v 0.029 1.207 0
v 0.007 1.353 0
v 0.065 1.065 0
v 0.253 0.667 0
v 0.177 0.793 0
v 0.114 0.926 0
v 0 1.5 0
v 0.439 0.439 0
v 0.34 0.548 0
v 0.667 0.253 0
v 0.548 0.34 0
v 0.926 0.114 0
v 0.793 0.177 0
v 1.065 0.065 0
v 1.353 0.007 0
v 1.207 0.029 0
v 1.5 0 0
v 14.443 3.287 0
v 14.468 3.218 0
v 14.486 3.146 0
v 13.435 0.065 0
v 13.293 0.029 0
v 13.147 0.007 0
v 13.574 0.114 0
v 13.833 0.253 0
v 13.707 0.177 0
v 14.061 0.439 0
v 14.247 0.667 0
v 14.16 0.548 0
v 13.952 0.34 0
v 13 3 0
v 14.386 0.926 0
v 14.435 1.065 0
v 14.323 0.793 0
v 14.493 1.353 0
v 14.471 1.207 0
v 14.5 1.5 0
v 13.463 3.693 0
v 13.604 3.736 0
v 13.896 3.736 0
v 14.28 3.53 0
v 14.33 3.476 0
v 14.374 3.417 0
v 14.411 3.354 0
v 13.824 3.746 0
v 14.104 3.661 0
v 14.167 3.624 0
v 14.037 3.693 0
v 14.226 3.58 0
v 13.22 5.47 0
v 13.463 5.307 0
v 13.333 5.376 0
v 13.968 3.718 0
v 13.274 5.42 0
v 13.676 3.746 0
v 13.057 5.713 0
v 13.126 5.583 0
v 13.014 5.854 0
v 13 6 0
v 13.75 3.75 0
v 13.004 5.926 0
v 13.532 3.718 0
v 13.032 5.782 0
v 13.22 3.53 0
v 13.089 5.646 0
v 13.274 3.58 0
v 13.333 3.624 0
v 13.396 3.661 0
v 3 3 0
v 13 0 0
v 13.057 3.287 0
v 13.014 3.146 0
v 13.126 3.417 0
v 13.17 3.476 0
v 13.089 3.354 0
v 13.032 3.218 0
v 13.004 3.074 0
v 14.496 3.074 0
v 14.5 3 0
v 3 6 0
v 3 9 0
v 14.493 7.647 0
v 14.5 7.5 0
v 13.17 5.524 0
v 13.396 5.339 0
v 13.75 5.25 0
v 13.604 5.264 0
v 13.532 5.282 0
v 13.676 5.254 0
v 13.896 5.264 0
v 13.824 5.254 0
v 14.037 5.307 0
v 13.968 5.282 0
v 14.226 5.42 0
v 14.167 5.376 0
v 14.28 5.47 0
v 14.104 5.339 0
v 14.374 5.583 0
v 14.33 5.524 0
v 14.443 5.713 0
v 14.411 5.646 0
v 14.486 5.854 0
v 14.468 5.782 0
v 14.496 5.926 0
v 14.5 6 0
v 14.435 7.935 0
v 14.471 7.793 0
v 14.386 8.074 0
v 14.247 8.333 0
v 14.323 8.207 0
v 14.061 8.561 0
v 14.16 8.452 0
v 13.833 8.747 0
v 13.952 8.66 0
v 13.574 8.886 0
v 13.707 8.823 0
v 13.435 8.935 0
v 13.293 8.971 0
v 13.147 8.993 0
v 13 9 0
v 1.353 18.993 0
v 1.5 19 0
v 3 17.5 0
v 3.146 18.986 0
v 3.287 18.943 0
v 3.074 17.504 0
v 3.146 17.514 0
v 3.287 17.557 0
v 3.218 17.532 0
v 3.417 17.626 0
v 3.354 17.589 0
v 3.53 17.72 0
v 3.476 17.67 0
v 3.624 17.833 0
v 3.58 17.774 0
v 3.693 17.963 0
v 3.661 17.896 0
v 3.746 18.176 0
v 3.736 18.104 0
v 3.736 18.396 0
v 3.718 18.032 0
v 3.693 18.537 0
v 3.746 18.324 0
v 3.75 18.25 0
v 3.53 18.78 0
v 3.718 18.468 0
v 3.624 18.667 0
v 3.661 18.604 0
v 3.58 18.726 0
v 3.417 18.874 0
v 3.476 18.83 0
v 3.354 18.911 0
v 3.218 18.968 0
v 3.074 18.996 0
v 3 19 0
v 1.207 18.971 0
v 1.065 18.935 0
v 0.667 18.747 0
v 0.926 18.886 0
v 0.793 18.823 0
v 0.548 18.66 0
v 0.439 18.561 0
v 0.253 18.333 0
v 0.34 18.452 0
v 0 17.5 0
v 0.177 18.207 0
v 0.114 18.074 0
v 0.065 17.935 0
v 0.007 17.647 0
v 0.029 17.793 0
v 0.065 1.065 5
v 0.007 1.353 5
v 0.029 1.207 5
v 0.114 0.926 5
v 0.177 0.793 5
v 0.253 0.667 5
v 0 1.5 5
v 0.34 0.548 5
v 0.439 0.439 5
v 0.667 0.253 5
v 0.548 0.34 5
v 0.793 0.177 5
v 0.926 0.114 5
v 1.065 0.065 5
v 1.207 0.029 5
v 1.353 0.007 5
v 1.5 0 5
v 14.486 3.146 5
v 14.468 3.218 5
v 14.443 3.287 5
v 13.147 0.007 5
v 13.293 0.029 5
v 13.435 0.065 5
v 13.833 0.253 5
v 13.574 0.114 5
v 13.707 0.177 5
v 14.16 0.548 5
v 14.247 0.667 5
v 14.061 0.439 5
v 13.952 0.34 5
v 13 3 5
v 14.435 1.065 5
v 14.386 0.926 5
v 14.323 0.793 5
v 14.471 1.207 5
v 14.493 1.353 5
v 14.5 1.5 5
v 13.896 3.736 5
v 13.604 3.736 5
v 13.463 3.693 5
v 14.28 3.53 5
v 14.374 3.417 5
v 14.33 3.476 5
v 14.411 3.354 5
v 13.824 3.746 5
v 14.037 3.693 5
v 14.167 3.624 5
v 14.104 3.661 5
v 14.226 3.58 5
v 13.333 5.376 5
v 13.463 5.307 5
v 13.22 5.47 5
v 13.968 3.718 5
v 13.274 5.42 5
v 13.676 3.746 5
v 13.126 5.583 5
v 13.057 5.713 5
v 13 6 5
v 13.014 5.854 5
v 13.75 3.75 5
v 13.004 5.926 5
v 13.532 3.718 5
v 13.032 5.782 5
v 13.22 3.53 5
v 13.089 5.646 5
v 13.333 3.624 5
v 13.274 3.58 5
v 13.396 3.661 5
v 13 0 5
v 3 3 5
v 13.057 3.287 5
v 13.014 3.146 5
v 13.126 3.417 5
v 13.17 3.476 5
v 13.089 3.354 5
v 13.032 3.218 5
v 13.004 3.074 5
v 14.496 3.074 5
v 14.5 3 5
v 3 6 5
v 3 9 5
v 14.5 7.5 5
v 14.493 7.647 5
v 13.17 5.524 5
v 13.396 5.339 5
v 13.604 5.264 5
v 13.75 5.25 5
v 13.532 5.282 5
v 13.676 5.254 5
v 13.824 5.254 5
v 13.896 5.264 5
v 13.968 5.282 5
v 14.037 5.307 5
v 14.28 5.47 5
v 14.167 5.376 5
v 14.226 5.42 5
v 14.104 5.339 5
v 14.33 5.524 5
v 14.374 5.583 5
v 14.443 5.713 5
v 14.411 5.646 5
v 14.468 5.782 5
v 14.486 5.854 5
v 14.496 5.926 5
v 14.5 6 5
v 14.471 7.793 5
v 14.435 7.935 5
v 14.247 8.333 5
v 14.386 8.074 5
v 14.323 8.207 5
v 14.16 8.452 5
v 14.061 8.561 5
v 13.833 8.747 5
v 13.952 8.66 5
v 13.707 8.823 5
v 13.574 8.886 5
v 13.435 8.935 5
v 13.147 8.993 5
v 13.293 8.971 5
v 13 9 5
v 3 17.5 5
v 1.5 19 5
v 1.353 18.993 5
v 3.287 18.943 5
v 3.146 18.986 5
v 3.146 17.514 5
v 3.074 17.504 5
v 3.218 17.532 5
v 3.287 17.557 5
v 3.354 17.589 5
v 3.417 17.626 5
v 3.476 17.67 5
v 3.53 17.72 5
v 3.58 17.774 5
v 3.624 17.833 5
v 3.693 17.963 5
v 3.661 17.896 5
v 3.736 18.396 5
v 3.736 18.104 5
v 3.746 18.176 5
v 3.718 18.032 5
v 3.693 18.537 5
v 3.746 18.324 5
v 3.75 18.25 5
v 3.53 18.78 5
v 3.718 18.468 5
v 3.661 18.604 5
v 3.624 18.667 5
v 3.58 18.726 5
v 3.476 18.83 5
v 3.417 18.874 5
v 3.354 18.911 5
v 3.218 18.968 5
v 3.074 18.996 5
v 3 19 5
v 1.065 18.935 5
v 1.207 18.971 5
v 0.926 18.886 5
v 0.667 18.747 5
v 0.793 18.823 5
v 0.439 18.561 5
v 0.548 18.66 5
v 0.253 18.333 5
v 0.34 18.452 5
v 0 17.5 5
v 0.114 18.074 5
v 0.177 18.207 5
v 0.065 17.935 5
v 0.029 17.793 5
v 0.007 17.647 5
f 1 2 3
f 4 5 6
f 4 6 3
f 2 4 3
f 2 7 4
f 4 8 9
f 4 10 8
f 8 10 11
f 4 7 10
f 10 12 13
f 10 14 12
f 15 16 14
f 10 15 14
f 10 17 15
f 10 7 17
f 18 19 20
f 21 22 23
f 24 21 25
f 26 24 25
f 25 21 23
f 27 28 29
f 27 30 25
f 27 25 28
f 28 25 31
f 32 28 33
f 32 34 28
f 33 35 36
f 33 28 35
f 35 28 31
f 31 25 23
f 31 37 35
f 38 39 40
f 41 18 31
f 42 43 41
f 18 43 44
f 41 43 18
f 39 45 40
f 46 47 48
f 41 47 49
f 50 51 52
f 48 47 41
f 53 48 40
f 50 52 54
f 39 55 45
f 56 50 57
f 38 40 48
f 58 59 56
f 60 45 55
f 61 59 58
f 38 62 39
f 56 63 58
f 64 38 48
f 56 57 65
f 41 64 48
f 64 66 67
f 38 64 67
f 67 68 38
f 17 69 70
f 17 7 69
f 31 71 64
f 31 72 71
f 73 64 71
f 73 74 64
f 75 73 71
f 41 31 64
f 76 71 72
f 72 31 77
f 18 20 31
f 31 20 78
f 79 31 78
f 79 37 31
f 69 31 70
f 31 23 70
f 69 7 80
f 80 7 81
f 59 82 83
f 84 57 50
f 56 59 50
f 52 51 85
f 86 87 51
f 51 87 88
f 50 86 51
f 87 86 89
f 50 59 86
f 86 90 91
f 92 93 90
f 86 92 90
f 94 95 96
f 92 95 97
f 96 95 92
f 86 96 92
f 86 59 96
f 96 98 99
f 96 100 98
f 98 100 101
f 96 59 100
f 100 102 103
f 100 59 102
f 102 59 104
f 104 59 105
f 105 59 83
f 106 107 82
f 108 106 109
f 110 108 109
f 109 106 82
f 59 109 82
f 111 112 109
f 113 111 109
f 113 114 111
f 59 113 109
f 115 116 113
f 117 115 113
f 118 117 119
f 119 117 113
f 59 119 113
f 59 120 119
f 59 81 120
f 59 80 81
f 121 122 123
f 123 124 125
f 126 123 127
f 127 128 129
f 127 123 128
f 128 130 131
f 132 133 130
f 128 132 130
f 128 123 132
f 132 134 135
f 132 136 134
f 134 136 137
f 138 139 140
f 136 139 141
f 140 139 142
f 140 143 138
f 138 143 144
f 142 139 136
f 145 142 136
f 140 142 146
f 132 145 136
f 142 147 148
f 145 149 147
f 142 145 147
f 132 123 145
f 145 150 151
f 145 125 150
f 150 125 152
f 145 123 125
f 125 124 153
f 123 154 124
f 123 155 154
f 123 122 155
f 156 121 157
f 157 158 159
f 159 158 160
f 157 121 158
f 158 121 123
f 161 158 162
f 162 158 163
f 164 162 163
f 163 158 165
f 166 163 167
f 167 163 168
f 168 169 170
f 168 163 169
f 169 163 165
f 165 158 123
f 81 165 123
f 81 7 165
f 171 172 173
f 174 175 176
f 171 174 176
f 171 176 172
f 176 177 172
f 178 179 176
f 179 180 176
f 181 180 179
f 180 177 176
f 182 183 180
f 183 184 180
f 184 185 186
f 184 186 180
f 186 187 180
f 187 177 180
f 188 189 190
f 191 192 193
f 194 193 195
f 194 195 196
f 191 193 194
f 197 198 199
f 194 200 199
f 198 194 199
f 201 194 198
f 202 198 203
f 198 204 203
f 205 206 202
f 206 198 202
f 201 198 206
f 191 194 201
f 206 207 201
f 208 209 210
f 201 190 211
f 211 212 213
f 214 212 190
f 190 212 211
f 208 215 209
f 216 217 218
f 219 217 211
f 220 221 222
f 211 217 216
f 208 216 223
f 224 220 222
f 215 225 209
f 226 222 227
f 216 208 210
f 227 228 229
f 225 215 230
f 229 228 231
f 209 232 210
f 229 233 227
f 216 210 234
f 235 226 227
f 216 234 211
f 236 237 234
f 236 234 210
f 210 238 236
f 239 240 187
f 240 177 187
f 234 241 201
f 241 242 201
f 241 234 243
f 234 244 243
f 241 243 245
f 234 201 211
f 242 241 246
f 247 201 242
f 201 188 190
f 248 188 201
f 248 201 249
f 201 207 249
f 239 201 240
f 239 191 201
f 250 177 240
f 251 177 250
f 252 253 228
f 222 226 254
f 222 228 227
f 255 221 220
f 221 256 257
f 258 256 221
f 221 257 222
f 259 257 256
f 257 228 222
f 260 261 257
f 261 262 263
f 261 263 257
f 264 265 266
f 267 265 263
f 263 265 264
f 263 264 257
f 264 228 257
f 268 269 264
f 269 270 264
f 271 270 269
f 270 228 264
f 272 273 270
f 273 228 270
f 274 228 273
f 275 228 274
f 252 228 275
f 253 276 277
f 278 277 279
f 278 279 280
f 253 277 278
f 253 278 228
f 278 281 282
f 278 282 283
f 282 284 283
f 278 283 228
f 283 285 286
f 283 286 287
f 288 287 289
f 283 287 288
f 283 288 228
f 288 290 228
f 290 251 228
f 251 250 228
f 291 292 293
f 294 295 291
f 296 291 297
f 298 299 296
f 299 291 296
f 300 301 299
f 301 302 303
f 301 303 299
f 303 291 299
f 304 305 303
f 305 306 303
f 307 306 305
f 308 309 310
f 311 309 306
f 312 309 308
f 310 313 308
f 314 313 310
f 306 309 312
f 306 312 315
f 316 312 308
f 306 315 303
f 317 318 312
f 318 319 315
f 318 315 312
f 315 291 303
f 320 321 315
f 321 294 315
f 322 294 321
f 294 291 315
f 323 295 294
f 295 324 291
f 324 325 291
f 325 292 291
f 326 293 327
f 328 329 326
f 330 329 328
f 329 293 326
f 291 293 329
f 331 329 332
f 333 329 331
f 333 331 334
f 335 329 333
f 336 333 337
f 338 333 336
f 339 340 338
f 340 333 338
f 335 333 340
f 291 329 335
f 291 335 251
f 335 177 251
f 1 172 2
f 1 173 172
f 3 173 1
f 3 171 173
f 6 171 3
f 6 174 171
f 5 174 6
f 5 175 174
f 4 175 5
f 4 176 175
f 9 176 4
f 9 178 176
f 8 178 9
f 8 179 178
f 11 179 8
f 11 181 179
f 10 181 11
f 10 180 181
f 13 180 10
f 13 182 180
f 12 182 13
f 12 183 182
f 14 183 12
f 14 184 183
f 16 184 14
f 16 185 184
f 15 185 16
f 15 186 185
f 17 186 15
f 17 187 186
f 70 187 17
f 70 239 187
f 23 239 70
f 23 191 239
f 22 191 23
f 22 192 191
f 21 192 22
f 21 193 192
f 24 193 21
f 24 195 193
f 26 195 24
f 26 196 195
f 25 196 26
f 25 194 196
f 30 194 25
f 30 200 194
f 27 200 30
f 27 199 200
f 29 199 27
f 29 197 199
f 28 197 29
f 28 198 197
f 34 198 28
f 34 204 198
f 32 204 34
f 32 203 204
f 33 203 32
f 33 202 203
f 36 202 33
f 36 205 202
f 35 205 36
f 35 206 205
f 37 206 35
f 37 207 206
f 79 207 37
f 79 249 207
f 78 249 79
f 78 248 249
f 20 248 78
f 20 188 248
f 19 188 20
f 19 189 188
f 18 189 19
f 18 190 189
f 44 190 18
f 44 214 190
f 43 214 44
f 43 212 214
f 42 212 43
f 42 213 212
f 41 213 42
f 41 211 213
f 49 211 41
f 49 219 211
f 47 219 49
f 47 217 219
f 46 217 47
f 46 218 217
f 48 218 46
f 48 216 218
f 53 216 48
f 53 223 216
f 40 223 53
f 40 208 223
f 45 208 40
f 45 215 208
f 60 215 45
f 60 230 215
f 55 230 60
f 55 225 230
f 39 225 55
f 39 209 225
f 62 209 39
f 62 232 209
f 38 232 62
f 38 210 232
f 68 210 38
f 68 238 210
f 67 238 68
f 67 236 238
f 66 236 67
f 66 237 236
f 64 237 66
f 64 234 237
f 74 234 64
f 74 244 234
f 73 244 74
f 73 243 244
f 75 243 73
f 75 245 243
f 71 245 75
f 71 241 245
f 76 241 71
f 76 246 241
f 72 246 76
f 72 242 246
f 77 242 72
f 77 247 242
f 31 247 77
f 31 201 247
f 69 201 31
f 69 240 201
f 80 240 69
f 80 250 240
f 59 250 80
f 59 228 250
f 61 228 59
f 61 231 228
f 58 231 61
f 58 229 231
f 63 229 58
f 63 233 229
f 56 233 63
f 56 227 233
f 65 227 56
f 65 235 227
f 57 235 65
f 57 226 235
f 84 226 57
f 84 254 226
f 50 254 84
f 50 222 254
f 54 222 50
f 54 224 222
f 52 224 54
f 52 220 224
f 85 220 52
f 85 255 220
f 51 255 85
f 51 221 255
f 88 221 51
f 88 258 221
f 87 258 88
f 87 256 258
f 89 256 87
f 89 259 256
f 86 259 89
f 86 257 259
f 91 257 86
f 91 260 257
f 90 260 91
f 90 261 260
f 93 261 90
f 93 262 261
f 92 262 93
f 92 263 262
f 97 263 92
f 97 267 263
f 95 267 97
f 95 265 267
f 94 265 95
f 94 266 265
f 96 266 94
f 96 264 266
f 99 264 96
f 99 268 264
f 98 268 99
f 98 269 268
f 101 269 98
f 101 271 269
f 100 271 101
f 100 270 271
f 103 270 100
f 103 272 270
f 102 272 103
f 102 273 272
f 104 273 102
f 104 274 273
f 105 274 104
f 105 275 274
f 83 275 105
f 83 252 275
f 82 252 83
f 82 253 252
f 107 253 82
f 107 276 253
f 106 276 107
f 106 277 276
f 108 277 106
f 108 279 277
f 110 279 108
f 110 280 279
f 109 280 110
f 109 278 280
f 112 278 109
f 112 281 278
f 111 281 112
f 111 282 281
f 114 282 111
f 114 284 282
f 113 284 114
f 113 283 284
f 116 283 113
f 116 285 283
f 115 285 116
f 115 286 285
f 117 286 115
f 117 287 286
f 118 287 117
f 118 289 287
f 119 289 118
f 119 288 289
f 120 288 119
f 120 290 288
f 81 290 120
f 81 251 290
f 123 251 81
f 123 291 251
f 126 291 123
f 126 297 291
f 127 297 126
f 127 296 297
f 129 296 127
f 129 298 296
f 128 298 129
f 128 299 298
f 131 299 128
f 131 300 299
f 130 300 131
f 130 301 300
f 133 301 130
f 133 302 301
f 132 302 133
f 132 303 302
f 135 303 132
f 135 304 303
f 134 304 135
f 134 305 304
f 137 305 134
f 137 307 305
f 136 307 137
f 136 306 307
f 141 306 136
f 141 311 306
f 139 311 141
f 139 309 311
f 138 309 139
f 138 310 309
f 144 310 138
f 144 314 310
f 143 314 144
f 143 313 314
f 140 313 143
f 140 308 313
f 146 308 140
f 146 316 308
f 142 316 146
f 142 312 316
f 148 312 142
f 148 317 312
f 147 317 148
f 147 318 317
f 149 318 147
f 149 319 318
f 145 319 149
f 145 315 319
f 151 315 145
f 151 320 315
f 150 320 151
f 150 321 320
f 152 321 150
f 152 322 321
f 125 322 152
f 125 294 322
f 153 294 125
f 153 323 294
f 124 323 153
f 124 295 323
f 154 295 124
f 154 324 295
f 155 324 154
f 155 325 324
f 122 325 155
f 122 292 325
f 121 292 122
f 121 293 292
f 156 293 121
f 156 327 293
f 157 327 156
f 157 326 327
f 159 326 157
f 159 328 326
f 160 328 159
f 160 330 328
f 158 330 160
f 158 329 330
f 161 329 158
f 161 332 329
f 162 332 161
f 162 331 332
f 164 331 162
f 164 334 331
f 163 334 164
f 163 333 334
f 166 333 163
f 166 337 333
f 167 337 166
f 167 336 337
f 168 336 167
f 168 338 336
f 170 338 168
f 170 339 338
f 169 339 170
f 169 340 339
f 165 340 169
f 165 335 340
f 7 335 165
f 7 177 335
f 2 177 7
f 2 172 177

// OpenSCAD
$fn = 64;

// all units in mm (millimeters)
// Parameters
u_thickness = 3;
u_width = 9;
u_height = 11.5;

grip_length = 10;

depth = 5;

round_r = 1.5;

module u_left_side() {
    // Circle to start rounded outer corner
    translate([round_r, round_r])
        circle(r = round_r);

    // Leftside (until the rounded corner on the outside)
    translate([round_r, 0])
        square([u_height, u_thickness]);
    // Leftside (half round_r corner on the outside + fill to inside)
    translate([round_r + u_height, round_r]) {
        circle(r = round_r);
        square([round_r, u_thickness - round_r]);
    }
    // Little grip for resistance on the left inside
    translate([u_height + 1.5 * round_r, u_thickness]) {
        circle(r = round_r / 2);
    }
}

module u_base() {
    // Just the base of the clamp (in between the left and right side)
    translate([0, round_r])
        square([u_thickness, u_width - round_r]);
}

module u_right_side() {
    // Rightside (No rounded corner because of the grip)
    translate([round_r, u_width - u_thickness])
        square([u_height, u_thickness]);
    // Rightside (half round_r corner on the outside)
    translate([u_height+round_r, u_width - round_r]) {
        circle(r = round_r);
    }
    // Rightside (fill to half round_r corner on the outside)
    translate([u_height + round_r, u_width - u_thickness]) {
        square([round_r, u_thickness - round_r]);
    }
    // Little grip for resistance on the right inside
    translate([u_height + round_r * 1.5, u_width - u_thickness]) {
        circle(r = round_r / 2);
    }
}

module grip() {
    // Grip (half rounded corner on the outside at the beginning of the grp)
    translate([0, u_width])
        square([u_thickness, grip_length - round_r]);
    // Afronding (grip rechteronderhoek)
    translate([round_r, u_width + grip_length - round_r]) {
        circle(r = round_r);
    }
    translate([round_r, u_width + grip_length - round_r]) {
        square([u_thickness - round_r, round_r]);
    }
    // Grip weerstand
    translate([u_thickness, u_width + grip_length - round_r * 0.5]) {
        circle(r = round_r / 2);
    }
}

module clamp_profile_2D() {
    u_left_side();
    u_base();
    u_right_side();
    grip();
}

module clamp_3D() {
    linear_extrude(height = depth)
        clamp_profile_2D();
}

clamp_3D();
